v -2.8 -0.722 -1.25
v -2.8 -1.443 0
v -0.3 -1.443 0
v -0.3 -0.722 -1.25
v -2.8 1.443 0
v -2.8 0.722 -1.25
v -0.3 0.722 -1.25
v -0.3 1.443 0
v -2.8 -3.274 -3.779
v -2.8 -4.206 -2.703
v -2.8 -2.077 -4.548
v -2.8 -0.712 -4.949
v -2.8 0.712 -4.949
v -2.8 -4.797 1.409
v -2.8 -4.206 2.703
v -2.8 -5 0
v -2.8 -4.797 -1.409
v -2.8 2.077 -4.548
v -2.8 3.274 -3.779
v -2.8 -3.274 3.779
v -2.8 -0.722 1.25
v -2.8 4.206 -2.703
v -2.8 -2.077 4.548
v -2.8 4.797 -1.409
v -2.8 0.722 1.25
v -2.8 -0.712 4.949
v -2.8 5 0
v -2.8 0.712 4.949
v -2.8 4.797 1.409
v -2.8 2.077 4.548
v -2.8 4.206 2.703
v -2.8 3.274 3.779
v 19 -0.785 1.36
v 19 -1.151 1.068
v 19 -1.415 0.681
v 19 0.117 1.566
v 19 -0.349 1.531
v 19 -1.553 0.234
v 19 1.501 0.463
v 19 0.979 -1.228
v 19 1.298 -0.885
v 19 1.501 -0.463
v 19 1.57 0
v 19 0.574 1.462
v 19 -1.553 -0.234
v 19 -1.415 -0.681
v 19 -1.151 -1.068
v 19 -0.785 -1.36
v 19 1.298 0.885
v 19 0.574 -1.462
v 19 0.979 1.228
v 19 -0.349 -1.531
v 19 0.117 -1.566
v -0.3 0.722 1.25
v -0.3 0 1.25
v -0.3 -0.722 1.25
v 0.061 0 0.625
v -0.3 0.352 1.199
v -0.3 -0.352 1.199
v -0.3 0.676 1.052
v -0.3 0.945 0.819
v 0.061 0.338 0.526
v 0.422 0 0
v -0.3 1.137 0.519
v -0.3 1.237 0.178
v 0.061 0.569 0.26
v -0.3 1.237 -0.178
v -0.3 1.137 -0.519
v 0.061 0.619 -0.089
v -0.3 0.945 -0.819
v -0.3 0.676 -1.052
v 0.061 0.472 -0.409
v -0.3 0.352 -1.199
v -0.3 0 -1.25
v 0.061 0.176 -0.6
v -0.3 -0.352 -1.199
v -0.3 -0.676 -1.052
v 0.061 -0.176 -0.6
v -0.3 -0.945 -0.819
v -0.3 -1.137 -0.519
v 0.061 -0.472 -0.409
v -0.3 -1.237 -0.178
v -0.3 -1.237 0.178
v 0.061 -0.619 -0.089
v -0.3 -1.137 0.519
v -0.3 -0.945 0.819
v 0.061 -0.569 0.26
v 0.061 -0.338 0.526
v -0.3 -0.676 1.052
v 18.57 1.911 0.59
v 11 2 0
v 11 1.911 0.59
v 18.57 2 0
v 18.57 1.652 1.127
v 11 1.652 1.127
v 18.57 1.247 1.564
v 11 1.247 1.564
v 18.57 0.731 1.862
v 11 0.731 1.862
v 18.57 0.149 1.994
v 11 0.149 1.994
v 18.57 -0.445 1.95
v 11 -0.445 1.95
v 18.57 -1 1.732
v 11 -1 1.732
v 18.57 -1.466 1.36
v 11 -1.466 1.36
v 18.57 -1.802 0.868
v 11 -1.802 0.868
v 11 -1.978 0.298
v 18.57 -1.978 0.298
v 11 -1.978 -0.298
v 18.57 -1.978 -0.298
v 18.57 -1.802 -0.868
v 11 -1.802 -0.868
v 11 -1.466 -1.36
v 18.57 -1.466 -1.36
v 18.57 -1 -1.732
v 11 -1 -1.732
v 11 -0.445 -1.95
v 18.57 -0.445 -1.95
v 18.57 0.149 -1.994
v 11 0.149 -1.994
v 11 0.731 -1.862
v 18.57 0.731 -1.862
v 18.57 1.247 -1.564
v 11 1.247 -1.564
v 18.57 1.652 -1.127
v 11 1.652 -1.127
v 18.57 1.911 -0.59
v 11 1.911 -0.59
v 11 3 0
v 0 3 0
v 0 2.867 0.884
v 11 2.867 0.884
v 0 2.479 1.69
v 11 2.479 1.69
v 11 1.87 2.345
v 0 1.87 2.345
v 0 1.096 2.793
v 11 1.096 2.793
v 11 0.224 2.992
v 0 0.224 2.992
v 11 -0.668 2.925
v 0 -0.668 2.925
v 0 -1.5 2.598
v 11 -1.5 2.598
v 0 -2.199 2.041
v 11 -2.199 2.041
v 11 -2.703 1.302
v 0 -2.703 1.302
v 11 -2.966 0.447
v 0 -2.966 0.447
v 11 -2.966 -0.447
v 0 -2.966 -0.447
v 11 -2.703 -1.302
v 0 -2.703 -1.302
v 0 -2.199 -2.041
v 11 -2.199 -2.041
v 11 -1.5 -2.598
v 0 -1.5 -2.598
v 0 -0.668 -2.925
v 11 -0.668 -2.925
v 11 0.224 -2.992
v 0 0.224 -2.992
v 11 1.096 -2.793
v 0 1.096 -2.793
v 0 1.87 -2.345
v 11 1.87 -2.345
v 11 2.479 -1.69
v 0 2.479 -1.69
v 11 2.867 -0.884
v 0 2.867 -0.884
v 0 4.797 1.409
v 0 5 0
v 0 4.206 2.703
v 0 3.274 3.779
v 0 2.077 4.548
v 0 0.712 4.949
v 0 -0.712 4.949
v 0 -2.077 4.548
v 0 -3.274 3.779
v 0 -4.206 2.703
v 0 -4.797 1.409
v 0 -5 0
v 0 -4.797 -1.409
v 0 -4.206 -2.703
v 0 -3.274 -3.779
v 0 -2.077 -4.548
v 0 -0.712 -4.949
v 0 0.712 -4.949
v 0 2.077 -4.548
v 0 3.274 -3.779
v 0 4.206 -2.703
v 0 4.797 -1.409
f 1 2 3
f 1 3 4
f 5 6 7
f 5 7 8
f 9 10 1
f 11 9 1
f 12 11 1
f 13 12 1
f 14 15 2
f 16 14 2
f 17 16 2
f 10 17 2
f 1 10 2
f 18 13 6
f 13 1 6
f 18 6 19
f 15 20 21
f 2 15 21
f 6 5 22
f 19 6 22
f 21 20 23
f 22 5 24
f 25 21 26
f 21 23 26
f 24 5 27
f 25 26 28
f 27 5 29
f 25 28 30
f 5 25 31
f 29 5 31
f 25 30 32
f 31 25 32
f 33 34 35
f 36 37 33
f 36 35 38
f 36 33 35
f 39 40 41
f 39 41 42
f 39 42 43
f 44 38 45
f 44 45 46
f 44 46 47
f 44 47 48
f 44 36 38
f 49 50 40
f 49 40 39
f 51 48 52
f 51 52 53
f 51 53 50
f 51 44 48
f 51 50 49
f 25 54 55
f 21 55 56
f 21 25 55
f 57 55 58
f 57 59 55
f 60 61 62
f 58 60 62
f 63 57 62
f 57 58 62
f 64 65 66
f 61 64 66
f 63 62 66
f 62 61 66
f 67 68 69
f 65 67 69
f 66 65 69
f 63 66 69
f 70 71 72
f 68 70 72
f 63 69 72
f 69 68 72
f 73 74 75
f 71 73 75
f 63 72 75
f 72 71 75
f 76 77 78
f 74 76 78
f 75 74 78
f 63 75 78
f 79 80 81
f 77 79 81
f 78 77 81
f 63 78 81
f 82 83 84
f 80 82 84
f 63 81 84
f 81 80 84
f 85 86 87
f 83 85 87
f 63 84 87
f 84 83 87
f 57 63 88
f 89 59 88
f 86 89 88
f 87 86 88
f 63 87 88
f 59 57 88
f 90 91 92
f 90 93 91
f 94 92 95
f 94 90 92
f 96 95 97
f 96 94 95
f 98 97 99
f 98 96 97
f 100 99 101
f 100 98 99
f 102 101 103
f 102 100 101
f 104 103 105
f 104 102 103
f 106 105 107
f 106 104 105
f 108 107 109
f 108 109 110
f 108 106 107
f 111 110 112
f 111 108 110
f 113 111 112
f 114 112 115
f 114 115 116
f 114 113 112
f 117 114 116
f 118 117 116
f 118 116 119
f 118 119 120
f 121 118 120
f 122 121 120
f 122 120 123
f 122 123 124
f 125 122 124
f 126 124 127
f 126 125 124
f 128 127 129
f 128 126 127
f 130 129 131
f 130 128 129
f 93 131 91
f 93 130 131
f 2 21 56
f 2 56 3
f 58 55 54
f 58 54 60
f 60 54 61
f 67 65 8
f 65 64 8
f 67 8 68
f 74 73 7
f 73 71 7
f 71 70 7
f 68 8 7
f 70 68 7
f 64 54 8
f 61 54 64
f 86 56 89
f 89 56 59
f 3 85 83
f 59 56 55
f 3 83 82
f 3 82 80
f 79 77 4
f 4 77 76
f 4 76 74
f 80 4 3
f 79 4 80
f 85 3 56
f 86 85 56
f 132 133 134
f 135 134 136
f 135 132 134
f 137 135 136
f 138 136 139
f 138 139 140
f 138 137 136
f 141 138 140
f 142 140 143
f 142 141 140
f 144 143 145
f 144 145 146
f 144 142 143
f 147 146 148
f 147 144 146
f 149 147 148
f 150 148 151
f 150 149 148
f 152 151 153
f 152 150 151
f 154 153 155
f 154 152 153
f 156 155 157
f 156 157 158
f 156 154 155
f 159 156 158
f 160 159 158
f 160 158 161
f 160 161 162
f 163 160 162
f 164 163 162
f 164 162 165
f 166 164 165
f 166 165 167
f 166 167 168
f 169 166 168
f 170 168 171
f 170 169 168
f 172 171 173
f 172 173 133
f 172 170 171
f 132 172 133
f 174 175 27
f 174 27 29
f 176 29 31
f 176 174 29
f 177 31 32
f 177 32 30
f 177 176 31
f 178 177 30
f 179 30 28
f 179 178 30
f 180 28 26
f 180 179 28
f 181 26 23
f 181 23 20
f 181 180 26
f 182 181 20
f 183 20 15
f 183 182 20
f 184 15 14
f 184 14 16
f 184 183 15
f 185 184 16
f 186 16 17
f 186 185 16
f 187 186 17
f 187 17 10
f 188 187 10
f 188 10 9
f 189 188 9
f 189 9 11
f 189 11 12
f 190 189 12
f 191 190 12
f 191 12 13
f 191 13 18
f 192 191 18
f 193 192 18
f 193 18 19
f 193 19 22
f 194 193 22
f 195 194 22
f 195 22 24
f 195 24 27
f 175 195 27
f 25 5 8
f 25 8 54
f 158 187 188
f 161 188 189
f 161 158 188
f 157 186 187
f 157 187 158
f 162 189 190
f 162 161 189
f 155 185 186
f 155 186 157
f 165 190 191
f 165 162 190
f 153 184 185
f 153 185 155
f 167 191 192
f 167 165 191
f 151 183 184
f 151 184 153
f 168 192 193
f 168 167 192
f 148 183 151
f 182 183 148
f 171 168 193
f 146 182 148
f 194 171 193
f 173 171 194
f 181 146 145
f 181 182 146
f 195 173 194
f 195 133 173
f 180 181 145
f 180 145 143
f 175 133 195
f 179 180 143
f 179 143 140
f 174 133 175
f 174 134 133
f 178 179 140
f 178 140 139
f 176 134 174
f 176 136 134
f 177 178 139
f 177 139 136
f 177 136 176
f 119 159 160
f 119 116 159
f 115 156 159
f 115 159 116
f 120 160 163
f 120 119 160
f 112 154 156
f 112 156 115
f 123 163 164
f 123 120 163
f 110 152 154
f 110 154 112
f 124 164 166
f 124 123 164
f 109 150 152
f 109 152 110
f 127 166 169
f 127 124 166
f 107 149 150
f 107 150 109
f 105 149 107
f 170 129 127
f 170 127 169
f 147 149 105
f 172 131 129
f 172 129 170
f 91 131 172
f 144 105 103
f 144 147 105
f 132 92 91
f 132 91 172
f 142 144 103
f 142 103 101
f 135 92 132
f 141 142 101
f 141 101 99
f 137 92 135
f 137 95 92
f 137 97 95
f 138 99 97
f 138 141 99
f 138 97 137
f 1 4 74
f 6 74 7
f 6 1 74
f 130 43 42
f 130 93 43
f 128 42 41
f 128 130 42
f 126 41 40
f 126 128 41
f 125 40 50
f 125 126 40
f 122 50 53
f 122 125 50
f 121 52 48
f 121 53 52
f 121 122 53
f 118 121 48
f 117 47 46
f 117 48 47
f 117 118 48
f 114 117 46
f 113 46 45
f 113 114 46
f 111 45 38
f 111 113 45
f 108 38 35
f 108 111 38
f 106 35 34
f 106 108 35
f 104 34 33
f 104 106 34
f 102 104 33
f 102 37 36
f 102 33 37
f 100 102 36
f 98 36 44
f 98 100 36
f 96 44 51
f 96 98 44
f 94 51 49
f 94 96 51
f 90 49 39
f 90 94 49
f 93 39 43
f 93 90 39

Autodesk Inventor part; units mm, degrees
ref_plane "YZ Plane" through (0, 0, 0) normal (1, 0, 0) x (0, 1, 0)
ref_plane "XZ Plane" through (0, 0, 0) normal (0, 1, 0) x (-1, 0, 0)
ref_plane "XY Plane" through (0, 0, 0) normal (0, 0, 1) x (1, 0, 0)
sketch "Sketch_1" plane through (0, 0, 0) normal (0, 0, 1) x (1, 0, 0)
  line L0 (11, 0) -> (-2.8, 0)
  line L1 (-2.8, 0) -> (-2.8, 5)
  line L2 (-2.8, 5) -> (0, 5)
  line L3 (0, 5) -> (0, 3)
  line L4 (0, 3) -> (11, 3)
  line L5 (11, 3) -> (11, 0)
  line L6 (11, 0) -> (-2.8, 0)
revolve "Revolution1" add sketch "Sketch_1" angle 360 about axis through (11, 0, 0) along (1, 0, 0)
sketch "Sketch2" plane through (-2.8, 0, 0) normal (-1, 0, 0) x (0, 0, 1)
  point P0 (0, 0)
hole "Hole1" at (-2.8, 0, 0) direction (1, 0, 0) diameter 2.5 depth 2.5 tip angle 120
sketch "Sketch_3" plane through (-2.8, 0, 0) normal (1, 0, 0) x (0, 0, -1)
  line L0 (-1.25, -0.7217) -> (0, -1.4434)
  line L1 (0, -1.4434) -> (1.25, -0.7217)
  line L2 (1.25, -0.7217) -> (1.25, 0.7217)
  line L3 (1.25, 0.7217) -> (0, 1.4434)
  line L4 (0, 1.4434) -> (-1.25, 0.7217)
  line L5 (-1.25, 0.7217) -> (-1.25, -0.7217)
extrude "Extrusion1" cut sketch "Sketch_3" along normal blind 2.5
sketch "Sketch_6" plane through (0, 0, 0) normal (0, 0, 1) x (1, 0, 0)
  line L0 (19, 0) -> (11, 0)
  line L1 (11, 0) -> (11, 2)
  line L2 (11, 2) -> (18.5705, 2)
  line L3 (18.5705, 2) -> (19, 1.5705)
  line L4 (19, 1.5705) -> (19, 0)
  line L5 (19, 0) -> (11, 0)
revolve "Revolution2" add sketch "Sketch_6" angle 360 about axis through (19, 0, 0) along (1, 0, 0)
thread "Thread1" size "M4x0.7" class "6g" standard "ISO Metric profile" length 6.3705
properties part number "DBTS4-11-8"
